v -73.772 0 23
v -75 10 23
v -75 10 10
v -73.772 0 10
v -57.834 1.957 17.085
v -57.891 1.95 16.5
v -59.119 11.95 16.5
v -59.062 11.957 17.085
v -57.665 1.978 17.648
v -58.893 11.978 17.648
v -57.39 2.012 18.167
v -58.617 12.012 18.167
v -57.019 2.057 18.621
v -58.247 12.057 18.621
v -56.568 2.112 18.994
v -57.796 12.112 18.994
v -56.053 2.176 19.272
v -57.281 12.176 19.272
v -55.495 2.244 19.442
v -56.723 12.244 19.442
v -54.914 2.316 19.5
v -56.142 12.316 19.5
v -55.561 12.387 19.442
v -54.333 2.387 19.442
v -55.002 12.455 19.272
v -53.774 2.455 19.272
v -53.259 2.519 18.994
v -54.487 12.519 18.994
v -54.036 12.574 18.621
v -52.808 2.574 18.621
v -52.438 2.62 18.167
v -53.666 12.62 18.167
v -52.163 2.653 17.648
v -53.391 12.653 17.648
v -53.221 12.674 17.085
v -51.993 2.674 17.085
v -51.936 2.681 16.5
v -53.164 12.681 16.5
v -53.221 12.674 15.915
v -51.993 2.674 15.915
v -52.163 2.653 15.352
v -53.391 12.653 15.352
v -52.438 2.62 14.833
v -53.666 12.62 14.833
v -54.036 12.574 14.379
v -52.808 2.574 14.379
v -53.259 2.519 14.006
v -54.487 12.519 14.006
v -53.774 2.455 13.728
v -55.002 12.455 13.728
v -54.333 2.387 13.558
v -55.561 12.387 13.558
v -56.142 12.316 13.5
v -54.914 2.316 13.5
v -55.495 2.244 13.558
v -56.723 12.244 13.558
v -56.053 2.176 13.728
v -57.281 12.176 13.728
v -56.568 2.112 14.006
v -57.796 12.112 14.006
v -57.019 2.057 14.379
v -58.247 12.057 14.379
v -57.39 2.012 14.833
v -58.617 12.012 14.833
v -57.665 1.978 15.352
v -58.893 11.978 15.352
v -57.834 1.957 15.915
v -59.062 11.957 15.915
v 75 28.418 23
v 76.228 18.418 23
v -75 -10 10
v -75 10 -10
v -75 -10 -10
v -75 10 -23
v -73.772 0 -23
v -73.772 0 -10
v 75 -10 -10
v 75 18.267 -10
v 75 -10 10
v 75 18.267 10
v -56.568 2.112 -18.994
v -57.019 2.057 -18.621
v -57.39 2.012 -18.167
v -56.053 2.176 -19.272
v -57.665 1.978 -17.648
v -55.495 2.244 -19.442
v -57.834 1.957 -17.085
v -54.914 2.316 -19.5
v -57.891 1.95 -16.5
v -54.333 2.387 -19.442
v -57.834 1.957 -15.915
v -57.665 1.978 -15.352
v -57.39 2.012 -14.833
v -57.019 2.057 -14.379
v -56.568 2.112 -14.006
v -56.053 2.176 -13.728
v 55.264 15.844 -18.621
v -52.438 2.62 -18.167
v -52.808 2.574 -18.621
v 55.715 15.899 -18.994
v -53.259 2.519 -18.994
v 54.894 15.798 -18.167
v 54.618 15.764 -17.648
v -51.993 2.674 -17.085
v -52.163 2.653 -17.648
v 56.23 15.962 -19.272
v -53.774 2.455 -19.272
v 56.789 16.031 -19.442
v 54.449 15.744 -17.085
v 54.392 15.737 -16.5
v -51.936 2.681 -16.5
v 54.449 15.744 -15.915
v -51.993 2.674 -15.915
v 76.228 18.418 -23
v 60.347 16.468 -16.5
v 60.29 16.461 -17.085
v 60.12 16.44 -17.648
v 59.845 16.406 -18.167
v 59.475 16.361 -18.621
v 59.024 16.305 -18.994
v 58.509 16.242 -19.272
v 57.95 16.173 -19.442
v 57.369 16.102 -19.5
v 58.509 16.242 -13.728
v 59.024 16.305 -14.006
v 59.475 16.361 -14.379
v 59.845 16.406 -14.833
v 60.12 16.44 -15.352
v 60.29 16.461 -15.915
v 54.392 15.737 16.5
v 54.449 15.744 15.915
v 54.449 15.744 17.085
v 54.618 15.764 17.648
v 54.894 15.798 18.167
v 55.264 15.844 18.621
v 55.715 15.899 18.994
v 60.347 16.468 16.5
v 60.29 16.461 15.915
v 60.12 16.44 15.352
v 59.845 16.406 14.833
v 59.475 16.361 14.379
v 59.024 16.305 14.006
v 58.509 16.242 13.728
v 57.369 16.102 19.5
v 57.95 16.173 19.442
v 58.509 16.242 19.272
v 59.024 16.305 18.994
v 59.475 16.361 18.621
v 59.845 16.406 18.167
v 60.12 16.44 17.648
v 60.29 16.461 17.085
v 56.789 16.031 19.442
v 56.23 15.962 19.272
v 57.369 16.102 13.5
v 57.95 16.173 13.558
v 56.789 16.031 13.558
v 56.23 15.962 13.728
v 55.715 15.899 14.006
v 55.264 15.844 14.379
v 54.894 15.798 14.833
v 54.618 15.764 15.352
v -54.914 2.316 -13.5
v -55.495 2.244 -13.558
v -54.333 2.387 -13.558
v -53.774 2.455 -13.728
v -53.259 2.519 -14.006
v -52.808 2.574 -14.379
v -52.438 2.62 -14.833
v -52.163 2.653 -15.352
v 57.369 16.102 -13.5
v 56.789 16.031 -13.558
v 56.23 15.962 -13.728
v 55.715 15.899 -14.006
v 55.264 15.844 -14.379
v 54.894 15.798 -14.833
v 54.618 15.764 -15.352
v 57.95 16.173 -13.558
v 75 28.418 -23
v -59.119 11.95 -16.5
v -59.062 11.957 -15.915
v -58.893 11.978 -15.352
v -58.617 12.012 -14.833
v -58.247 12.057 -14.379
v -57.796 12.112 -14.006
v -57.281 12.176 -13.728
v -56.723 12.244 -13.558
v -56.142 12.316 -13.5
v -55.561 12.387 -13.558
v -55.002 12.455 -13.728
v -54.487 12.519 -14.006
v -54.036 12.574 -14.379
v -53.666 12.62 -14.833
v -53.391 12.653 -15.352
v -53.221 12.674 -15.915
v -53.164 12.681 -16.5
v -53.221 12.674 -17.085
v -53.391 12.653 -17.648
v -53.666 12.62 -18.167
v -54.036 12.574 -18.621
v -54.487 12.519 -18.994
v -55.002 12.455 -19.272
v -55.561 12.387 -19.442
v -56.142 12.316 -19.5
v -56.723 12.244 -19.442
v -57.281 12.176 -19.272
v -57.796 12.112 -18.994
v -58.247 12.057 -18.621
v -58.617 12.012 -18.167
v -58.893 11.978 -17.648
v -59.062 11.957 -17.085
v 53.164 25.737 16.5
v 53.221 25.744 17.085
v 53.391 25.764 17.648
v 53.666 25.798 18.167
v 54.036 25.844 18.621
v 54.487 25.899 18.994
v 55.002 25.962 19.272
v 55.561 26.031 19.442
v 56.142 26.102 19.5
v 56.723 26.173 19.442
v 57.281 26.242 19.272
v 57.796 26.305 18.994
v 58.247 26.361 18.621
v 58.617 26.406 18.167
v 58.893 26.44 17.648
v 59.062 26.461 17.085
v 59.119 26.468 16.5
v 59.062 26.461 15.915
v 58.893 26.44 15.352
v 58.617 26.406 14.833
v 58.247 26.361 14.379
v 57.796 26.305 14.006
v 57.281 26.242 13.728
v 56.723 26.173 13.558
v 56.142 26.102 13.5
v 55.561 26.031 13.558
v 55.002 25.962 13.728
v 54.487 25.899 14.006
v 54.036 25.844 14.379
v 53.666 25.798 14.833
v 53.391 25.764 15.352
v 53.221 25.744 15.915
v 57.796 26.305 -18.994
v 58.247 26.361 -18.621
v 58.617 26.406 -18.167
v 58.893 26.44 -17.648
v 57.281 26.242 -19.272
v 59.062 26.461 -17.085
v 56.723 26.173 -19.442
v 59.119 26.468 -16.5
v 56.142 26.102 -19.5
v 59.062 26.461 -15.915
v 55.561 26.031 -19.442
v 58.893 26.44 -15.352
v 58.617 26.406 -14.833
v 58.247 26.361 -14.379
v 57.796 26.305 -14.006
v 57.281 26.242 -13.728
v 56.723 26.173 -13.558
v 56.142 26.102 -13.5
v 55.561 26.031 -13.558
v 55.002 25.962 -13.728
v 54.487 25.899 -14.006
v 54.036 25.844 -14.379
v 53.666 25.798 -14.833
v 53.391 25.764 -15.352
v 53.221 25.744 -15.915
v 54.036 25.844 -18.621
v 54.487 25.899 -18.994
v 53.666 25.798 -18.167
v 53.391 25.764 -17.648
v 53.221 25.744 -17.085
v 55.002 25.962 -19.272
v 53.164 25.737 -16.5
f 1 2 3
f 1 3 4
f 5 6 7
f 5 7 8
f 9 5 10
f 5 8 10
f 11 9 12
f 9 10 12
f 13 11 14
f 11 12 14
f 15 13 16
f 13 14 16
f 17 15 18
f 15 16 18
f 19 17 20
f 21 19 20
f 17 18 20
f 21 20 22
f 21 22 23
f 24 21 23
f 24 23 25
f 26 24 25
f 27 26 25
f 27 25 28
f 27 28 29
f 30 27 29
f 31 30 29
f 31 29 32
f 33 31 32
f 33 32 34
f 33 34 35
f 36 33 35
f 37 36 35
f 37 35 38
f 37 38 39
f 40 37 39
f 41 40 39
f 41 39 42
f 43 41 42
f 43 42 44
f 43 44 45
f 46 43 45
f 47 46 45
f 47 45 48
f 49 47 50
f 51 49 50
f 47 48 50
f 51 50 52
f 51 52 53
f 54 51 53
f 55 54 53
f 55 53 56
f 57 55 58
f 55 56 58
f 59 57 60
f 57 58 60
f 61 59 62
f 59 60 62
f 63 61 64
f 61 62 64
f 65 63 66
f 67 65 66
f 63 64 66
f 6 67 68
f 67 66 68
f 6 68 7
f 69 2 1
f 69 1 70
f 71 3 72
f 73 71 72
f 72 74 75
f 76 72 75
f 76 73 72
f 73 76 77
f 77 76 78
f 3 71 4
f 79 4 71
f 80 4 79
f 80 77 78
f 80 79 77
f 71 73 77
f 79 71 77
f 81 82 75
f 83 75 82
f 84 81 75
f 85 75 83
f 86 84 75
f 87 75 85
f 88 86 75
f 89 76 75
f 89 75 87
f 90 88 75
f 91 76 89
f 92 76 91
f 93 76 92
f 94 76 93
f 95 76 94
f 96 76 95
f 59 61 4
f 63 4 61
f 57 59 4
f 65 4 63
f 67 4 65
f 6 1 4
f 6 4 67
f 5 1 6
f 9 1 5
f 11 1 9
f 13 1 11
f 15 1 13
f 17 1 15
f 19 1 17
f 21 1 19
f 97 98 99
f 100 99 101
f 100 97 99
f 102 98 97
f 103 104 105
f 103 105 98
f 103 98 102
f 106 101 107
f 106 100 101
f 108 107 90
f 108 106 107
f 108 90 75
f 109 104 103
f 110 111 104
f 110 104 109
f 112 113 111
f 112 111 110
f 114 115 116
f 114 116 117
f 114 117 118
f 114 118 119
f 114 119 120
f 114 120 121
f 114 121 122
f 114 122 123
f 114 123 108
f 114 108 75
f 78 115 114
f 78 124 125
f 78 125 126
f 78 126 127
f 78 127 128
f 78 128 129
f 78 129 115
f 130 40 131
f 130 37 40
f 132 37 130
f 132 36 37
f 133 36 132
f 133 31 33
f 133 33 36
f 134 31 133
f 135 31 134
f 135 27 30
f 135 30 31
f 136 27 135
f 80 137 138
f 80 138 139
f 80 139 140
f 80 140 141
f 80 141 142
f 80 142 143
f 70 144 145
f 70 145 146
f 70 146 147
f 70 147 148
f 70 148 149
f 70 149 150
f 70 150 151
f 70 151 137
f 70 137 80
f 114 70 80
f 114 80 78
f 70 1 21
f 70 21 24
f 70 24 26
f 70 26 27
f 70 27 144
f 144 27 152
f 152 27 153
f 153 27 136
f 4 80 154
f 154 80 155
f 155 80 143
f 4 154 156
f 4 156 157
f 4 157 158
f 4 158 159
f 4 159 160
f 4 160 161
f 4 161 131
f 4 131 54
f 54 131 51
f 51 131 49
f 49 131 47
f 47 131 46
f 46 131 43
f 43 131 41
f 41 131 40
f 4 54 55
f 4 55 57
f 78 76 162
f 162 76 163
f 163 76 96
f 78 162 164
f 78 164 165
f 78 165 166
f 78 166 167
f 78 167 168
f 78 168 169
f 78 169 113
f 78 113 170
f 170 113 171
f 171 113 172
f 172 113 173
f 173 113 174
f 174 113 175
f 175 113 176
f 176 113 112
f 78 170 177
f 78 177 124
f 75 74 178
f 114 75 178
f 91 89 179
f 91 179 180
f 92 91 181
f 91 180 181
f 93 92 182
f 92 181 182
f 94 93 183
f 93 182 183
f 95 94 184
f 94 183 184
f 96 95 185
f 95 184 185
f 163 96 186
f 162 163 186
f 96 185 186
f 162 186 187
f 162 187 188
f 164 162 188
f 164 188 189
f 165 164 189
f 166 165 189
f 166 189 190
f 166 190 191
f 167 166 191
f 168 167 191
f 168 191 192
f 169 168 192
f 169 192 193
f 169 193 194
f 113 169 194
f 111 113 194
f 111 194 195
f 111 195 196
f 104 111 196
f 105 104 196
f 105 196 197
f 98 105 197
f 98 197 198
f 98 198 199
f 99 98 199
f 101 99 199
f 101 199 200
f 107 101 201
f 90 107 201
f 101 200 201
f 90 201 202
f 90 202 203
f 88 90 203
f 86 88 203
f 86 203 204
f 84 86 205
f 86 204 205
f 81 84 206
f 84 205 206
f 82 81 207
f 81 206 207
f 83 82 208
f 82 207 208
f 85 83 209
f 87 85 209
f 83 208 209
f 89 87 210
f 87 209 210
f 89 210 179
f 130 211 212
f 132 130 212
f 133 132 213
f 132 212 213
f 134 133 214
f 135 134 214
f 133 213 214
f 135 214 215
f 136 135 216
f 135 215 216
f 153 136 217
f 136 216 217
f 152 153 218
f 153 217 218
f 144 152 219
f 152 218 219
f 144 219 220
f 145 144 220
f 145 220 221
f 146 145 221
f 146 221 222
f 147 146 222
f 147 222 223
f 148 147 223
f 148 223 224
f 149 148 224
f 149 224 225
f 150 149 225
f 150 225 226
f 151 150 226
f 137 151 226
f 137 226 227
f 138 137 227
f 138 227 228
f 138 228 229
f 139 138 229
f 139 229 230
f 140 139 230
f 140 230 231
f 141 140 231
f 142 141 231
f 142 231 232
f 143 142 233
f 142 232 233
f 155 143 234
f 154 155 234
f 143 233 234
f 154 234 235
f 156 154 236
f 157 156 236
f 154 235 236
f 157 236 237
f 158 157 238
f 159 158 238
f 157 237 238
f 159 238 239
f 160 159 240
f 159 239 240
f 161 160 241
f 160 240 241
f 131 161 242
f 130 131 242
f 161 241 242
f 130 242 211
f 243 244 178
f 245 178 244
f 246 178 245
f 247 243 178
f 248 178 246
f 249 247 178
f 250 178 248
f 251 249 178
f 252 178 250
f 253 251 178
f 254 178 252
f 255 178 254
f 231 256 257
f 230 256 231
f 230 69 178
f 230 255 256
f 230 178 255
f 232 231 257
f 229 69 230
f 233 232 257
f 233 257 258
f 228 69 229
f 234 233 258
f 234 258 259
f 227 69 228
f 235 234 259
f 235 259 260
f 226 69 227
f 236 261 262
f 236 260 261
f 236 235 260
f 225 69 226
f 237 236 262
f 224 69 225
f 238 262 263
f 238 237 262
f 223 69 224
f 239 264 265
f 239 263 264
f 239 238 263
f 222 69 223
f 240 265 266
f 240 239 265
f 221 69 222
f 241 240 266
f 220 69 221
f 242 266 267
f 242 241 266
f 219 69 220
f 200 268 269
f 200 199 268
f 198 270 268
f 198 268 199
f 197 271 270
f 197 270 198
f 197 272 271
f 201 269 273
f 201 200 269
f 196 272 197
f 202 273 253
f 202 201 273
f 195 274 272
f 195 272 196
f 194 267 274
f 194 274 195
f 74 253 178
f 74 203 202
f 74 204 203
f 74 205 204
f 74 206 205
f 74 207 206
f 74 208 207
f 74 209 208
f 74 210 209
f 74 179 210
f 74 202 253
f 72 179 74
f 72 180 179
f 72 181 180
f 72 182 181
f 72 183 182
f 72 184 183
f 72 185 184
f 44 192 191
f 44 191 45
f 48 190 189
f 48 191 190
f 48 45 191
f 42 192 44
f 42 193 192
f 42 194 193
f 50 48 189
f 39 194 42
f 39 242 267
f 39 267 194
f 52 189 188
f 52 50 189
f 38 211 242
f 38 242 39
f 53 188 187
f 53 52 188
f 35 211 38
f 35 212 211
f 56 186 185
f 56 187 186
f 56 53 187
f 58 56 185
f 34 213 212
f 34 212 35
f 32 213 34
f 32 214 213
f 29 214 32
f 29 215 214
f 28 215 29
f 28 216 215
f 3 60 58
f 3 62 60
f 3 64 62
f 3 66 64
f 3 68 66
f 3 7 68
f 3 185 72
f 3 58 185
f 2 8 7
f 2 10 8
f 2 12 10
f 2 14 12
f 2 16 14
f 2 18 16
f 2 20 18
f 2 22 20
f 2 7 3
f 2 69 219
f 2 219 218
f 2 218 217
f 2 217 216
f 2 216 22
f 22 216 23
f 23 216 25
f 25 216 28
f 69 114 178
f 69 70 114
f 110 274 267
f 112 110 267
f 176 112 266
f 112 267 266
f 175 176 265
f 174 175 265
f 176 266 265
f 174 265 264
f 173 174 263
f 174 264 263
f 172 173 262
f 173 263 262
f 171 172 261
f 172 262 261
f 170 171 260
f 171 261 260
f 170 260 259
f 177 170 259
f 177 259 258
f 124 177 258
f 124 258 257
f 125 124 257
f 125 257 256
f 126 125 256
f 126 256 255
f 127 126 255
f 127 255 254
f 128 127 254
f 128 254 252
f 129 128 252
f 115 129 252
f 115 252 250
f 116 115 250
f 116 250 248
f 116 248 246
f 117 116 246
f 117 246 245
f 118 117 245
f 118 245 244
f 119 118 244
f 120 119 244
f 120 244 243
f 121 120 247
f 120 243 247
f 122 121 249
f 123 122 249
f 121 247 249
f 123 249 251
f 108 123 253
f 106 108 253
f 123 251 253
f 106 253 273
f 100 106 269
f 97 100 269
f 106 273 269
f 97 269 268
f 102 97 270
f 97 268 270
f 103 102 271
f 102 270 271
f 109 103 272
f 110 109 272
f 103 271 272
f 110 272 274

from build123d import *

# Parameters (mm, degrees)
SKETCH1_W           = 150
SKETCH1_H           = 20
BOSS_EXTRUDE1_DEPTH = 10
BOSS_EXTRUDE2_DEPTH = 10
BOSS_EXTRUDE3_DEPTH = 23
SKETCH6_R           = 3
CUT_EXTRUDE2_DEPTH  = 46


with BuildPart() as part:
    # Sketch1 → Boss-Extrude1 (new, symmetric)
    with BuildSketch(Plane(origin=(0, 0, 0), x_dir=(1, 0, 0), z_dir=(0, 1, 0))):
        Rectangle(SKETCH1_W, SKETCH1_H)
    extrude(amount=BOSS_EXTRUDE1_DEPTH, both=True)

    # Sketch2 → Boss-Extrude2 (add, symmetric)
    with BuildSketch(Plane.XY):
        Polygon((-75, 10), (75, 10), (75, 28.417684135), align=None)
    extrude(amount=BOSS_EXTRUDE2_DEPTH, both=True)

    # Sketch3 → Boss-Extrude3 (add, symmetric)
    with BuildSketch(Plane.XY):
        Polygon((75, 28.417684135), (-75, 10), (-73.772154391, 0), (76.227845609, 18.417684135), align=None)
    extrude(amount=BOSS_EXTRUDE3_DEPTH, both=True)

    # Sketch6 → Cut-Extrude2 (cut)
    with BuildSketch(Plane(origin=(-2.323519743, 18.923549716, 0), x_dir=(0.9925461516413229, 0.12186934340514101, 0), z_dir=(-0.12186934340514102, 0.992546151641323, 0))):
        with Locations(Location((-54.222267939, 16.5, 0), (0, 0, 180))):
            Circle(SKETCH6_R)
        with Locations(Location((58.90420588, 16.5, 0), (0, 0, 180))):
            Circle(SKETCH6_R)
        with Locations(Location((58.90420588, -16.5, 0), (0, 0, 180))):
            Circle(SKETCH6_R)
        with Locations(Location((-54.222267939, -16.5, 0), (0, 0, 180))):
            Circle(SKETCH6_R)
    extrude(amount=-CUT_EXTRUDE2_DEPTH, mode=Mode.SUBTRACT)


solid = part.part
